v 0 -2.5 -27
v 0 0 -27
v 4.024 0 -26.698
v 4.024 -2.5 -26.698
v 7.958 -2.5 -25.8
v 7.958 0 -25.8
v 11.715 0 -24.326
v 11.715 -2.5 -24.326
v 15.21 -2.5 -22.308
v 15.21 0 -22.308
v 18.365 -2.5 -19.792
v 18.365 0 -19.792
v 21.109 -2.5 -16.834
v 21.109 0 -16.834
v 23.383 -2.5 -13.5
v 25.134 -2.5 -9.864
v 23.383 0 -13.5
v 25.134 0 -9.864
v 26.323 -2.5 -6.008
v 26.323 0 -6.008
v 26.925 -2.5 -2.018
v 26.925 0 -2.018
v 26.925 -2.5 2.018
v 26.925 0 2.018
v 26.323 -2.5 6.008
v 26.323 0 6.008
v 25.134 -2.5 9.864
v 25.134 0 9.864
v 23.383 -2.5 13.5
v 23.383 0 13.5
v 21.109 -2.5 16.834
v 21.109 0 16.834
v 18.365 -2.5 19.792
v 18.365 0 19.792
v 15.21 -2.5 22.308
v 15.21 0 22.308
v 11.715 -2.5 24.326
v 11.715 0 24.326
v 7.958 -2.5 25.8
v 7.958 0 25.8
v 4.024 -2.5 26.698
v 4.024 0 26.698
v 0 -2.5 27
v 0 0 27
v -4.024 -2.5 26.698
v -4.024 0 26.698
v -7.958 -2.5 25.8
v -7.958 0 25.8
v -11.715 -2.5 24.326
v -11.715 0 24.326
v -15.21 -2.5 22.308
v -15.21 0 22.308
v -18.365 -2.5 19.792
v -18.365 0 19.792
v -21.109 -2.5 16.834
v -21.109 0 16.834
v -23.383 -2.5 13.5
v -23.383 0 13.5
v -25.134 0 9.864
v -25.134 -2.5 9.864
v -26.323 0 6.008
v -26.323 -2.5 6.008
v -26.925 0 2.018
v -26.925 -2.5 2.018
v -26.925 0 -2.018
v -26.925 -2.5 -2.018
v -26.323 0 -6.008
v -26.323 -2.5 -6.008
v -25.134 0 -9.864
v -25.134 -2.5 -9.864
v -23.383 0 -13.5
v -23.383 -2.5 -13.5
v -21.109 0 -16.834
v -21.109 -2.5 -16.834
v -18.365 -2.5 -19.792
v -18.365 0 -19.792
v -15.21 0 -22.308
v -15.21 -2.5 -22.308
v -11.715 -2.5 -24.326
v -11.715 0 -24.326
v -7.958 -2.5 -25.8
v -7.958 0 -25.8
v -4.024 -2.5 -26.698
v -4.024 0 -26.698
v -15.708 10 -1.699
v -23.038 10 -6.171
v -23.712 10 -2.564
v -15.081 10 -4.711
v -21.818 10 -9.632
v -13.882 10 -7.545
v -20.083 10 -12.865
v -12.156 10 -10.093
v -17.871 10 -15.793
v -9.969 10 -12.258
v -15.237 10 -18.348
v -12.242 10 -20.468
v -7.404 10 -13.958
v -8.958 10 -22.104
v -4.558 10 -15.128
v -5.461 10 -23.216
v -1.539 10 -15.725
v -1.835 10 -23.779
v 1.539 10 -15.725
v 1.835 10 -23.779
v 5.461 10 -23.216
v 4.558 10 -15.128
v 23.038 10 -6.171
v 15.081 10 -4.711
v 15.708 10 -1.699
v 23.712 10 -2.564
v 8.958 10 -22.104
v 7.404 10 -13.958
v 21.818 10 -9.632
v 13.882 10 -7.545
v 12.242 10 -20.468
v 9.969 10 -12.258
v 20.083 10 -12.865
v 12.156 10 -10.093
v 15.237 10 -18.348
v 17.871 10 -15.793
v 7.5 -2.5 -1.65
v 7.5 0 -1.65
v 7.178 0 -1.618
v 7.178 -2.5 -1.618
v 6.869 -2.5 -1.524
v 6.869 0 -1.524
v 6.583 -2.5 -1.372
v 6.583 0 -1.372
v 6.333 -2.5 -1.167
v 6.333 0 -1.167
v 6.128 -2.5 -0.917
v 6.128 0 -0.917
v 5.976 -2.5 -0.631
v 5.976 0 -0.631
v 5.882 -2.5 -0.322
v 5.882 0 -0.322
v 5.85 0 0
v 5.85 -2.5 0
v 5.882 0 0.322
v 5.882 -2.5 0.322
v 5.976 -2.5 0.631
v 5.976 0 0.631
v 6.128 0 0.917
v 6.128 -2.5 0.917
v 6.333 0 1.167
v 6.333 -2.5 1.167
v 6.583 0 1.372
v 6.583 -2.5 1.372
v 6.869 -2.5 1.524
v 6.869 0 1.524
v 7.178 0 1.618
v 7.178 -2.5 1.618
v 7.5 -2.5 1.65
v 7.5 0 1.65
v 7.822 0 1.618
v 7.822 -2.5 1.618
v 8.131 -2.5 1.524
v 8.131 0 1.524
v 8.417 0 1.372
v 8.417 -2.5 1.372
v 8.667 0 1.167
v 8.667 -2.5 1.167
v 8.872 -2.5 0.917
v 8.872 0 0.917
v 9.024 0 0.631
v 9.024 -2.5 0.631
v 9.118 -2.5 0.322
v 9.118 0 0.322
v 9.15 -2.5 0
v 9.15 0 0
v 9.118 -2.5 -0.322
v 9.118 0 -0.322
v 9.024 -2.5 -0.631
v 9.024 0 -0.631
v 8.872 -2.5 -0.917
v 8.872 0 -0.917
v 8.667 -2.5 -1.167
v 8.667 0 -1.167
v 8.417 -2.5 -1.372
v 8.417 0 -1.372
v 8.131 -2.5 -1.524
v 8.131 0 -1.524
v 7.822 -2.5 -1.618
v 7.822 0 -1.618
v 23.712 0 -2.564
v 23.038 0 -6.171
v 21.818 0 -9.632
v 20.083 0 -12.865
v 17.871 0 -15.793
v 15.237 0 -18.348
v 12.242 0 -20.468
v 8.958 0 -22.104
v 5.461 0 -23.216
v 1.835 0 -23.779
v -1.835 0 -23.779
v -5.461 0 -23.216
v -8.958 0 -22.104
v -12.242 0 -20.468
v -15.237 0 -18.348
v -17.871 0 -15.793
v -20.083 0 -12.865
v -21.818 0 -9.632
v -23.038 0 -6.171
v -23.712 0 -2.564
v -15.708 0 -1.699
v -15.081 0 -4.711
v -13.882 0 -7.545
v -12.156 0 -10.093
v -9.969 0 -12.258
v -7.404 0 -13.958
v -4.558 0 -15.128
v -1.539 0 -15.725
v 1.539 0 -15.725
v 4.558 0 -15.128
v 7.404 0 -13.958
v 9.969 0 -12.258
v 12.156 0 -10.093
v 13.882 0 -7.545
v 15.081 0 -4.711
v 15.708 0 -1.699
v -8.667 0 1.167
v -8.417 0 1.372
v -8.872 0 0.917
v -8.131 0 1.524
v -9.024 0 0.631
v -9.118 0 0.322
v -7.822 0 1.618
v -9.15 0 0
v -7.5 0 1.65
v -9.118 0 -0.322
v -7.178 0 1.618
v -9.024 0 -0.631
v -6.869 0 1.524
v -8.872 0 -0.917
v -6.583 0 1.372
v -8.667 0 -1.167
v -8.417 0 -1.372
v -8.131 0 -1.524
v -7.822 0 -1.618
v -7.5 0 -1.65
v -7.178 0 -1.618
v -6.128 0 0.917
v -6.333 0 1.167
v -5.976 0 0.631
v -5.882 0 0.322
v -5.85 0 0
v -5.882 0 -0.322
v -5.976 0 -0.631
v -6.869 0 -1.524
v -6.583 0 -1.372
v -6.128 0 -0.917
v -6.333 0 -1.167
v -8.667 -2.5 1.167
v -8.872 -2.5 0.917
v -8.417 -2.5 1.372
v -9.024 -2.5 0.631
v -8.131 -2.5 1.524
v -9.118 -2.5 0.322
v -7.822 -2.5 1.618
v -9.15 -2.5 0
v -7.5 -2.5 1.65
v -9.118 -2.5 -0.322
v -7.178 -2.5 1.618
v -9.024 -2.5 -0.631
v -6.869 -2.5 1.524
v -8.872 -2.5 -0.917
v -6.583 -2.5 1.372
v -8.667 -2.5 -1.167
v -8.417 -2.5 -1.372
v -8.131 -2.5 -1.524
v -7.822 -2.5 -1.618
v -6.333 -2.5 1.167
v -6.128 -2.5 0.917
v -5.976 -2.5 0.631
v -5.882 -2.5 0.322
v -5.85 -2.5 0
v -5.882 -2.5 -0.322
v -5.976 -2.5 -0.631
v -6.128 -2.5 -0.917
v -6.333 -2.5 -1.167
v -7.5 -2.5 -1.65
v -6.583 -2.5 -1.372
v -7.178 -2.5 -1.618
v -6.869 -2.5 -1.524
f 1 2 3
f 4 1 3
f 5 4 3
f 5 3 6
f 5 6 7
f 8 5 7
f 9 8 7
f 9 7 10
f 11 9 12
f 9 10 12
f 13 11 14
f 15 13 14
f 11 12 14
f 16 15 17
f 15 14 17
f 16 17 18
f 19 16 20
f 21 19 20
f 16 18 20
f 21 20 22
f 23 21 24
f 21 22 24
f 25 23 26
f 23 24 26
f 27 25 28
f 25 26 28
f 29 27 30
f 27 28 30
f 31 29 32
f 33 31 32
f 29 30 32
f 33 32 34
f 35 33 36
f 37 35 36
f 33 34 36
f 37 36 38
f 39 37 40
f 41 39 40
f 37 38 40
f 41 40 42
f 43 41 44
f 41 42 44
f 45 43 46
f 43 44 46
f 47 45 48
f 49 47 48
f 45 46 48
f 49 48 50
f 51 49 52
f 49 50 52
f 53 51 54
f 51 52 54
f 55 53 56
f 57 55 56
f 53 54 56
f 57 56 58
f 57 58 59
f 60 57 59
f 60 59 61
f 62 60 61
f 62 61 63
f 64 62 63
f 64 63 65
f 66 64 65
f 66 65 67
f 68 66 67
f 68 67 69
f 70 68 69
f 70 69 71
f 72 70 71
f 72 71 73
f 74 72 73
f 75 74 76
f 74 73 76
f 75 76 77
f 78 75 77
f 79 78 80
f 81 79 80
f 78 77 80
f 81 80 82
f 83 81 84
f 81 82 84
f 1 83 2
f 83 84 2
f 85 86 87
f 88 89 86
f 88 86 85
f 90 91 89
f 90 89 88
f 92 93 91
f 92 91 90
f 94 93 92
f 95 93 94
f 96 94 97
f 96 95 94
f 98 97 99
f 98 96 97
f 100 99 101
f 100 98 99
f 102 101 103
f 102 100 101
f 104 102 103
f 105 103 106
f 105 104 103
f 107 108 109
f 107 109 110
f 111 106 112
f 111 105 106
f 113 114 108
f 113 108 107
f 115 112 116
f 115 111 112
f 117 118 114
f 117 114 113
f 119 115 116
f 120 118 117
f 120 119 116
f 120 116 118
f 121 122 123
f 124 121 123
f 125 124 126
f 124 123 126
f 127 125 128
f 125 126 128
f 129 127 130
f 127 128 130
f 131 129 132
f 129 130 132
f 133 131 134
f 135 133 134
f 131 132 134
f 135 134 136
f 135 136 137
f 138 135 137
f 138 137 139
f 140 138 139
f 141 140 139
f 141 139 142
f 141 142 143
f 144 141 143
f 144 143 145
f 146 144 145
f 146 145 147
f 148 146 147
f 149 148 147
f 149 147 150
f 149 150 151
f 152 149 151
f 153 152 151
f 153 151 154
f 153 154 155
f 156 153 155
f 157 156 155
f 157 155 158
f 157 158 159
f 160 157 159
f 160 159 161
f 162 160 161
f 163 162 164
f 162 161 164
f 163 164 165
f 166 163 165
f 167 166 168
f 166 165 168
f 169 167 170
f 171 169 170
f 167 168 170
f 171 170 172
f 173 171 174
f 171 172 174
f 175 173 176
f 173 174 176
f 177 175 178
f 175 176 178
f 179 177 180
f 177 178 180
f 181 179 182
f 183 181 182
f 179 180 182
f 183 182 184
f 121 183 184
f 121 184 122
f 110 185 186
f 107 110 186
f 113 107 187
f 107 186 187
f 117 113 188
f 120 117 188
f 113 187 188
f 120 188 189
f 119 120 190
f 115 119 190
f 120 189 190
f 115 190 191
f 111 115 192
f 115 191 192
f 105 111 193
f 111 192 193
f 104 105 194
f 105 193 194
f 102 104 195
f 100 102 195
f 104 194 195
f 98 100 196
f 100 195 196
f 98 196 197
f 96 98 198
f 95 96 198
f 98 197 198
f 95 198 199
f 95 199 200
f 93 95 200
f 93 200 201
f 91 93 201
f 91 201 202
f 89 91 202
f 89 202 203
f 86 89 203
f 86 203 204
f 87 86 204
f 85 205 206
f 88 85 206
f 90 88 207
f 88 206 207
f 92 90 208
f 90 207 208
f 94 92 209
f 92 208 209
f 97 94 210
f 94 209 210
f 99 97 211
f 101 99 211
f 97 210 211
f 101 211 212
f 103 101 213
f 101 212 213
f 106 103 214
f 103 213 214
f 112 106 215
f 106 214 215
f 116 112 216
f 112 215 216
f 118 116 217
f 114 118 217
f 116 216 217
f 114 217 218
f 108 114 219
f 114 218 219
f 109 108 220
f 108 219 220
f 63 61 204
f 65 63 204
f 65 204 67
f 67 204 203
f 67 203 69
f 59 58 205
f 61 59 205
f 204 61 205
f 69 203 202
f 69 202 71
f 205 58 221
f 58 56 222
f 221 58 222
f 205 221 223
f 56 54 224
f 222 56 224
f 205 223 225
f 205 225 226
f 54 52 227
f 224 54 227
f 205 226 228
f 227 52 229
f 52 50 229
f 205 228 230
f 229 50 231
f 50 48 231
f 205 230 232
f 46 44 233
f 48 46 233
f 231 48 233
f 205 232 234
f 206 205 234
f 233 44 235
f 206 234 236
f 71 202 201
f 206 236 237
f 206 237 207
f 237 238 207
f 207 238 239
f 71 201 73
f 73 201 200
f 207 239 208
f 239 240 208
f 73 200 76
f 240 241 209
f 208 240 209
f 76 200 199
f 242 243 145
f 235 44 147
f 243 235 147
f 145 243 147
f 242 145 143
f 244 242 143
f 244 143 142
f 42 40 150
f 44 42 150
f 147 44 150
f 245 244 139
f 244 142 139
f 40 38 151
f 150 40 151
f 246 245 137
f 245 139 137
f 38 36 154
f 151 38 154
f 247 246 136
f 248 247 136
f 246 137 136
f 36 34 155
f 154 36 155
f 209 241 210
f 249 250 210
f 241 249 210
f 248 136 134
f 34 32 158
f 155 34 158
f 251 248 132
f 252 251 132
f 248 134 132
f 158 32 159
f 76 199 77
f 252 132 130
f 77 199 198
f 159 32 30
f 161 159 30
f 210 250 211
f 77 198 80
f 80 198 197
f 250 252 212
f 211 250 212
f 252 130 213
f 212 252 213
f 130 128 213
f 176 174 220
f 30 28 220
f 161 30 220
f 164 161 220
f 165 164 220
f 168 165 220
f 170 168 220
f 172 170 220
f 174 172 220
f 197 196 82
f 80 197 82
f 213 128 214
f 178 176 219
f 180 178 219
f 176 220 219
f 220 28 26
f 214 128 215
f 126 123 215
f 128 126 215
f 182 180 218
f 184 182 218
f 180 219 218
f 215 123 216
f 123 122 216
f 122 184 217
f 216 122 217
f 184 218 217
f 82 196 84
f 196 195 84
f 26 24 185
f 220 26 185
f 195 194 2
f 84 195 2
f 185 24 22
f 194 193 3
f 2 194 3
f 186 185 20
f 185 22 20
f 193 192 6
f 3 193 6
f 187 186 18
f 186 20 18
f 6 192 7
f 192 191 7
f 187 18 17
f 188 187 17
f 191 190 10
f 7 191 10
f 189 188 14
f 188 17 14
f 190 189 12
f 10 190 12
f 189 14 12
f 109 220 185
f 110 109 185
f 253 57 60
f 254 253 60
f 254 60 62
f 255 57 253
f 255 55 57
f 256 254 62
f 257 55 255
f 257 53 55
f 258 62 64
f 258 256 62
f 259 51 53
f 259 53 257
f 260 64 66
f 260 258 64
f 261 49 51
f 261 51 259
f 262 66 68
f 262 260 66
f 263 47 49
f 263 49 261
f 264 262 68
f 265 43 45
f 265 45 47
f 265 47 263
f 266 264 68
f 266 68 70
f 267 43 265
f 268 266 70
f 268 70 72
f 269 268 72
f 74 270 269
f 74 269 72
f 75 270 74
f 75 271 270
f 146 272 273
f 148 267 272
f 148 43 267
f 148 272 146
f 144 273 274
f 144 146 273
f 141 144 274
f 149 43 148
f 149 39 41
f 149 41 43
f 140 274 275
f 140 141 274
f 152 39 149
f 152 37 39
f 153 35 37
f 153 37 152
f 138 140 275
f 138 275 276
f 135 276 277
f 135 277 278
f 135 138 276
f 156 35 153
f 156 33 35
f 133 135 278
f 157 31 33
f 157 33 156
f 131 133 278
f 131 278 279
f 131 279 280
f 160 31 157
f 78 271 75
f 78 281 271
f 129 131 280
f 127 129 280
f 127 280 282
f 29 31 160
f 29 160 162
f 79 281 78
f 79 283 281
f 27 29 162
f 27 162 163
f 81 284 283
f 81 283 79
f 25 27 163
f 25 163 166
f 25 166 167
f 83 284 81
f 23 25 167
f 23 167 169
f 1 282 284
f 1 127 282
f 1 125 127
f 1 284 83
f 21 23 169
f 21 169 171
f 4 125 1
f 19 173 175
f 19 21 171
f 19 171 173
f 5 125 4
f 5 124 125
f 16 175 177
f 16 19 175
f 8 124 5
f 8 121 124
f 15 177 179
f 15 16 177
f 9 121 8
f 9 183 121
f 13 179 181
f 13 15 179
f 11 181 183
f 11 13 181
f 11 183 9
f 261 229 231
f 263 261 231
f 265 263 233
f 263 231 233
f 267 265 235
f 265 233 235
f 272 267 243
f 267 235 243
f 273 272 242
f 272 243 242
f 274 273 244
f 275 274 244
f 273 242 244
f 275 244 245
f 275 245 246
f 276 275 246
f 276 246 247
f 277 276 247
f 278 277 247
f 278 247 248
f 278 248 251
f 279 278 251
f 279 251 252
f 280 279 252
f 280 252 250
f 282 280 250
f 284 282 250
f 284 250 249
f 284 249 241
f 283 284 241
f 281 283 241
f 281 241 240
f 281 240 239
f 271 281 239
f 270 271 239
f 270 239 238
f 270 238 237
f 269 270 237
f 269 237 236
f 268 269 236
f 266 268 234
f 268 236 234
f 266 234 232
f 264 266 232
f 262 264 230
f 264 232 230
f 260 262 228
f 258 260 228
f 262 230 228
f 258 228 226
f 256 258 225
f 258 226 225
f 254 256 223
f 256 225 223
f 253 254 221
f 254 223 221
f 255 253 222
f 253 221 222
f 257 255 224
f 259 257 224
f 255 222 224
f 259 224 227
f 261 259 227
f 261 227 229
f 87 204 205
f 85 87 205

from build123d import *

# Parameters (mm, degrees)
BOSS_EXTRUDE1_DEPTH = 10
SKETCH2_R           = 27
BOSS_EXTRUDE2_DEPTH = 2.5
SKETCH3_R           = 1.65
CUT_EXTRUDE1_DEPTH  = 10


with BuildPart() as part:
    # Sketch1 → Boss-Extrude1 (new body)
    with BuildSketch(Plane(origin=(0, 0, 0), x_dir=(1, 0, 0), z_dir=(0, 1, 0))):
        with BuildLine():
            Line((-23.711759029, 2.564173113), (-15.708418979, 1.698697492))
            ThreePointArc((-15.708418979, 1.698697492), (0, 15.8), (15.708418979, 1.698697492))
            Line((15.708418979, 1.698697492), (23.711759029, 2.564173113))
            ThreePointArc((23.711759029, 2.564173113), (0, 23.85), (-23.711759029, 2.564173113))
        make_face()
    extrude(amount=BOSS_EXTRUDE1_DEPTH)

    # Sketch2 → Boss-Extrude2 (add)
    with BuildSketch(Plane.XZ):
        with Locations(Location((0, 0, 0), (0, 0, 270))):
            Circle(SKETCH2_R)
    extrude(amount=BOSS_EXTRUDE2_DEPTH)

    # Sketch3 → Cut-Extrude1 (cut)
    with BuildSketch(Plane(origin=(0, 0, 0), x_dir=(1, 0, 0), z_dir=(0, 1, 0))):
        with Locations(Location((-7.5, 0, 0), (0, 0, 270))):
            Circle(SKETCH3_R)
        with Locations(Location((7.5, 0, 0), (0, 0, 90))):
            Circle(SKETCH3_R)
    extrude(amount=-CUT_EXTRUDE1_DEPTH, mode=Mode.SUBTRACT)


solid = part.part
